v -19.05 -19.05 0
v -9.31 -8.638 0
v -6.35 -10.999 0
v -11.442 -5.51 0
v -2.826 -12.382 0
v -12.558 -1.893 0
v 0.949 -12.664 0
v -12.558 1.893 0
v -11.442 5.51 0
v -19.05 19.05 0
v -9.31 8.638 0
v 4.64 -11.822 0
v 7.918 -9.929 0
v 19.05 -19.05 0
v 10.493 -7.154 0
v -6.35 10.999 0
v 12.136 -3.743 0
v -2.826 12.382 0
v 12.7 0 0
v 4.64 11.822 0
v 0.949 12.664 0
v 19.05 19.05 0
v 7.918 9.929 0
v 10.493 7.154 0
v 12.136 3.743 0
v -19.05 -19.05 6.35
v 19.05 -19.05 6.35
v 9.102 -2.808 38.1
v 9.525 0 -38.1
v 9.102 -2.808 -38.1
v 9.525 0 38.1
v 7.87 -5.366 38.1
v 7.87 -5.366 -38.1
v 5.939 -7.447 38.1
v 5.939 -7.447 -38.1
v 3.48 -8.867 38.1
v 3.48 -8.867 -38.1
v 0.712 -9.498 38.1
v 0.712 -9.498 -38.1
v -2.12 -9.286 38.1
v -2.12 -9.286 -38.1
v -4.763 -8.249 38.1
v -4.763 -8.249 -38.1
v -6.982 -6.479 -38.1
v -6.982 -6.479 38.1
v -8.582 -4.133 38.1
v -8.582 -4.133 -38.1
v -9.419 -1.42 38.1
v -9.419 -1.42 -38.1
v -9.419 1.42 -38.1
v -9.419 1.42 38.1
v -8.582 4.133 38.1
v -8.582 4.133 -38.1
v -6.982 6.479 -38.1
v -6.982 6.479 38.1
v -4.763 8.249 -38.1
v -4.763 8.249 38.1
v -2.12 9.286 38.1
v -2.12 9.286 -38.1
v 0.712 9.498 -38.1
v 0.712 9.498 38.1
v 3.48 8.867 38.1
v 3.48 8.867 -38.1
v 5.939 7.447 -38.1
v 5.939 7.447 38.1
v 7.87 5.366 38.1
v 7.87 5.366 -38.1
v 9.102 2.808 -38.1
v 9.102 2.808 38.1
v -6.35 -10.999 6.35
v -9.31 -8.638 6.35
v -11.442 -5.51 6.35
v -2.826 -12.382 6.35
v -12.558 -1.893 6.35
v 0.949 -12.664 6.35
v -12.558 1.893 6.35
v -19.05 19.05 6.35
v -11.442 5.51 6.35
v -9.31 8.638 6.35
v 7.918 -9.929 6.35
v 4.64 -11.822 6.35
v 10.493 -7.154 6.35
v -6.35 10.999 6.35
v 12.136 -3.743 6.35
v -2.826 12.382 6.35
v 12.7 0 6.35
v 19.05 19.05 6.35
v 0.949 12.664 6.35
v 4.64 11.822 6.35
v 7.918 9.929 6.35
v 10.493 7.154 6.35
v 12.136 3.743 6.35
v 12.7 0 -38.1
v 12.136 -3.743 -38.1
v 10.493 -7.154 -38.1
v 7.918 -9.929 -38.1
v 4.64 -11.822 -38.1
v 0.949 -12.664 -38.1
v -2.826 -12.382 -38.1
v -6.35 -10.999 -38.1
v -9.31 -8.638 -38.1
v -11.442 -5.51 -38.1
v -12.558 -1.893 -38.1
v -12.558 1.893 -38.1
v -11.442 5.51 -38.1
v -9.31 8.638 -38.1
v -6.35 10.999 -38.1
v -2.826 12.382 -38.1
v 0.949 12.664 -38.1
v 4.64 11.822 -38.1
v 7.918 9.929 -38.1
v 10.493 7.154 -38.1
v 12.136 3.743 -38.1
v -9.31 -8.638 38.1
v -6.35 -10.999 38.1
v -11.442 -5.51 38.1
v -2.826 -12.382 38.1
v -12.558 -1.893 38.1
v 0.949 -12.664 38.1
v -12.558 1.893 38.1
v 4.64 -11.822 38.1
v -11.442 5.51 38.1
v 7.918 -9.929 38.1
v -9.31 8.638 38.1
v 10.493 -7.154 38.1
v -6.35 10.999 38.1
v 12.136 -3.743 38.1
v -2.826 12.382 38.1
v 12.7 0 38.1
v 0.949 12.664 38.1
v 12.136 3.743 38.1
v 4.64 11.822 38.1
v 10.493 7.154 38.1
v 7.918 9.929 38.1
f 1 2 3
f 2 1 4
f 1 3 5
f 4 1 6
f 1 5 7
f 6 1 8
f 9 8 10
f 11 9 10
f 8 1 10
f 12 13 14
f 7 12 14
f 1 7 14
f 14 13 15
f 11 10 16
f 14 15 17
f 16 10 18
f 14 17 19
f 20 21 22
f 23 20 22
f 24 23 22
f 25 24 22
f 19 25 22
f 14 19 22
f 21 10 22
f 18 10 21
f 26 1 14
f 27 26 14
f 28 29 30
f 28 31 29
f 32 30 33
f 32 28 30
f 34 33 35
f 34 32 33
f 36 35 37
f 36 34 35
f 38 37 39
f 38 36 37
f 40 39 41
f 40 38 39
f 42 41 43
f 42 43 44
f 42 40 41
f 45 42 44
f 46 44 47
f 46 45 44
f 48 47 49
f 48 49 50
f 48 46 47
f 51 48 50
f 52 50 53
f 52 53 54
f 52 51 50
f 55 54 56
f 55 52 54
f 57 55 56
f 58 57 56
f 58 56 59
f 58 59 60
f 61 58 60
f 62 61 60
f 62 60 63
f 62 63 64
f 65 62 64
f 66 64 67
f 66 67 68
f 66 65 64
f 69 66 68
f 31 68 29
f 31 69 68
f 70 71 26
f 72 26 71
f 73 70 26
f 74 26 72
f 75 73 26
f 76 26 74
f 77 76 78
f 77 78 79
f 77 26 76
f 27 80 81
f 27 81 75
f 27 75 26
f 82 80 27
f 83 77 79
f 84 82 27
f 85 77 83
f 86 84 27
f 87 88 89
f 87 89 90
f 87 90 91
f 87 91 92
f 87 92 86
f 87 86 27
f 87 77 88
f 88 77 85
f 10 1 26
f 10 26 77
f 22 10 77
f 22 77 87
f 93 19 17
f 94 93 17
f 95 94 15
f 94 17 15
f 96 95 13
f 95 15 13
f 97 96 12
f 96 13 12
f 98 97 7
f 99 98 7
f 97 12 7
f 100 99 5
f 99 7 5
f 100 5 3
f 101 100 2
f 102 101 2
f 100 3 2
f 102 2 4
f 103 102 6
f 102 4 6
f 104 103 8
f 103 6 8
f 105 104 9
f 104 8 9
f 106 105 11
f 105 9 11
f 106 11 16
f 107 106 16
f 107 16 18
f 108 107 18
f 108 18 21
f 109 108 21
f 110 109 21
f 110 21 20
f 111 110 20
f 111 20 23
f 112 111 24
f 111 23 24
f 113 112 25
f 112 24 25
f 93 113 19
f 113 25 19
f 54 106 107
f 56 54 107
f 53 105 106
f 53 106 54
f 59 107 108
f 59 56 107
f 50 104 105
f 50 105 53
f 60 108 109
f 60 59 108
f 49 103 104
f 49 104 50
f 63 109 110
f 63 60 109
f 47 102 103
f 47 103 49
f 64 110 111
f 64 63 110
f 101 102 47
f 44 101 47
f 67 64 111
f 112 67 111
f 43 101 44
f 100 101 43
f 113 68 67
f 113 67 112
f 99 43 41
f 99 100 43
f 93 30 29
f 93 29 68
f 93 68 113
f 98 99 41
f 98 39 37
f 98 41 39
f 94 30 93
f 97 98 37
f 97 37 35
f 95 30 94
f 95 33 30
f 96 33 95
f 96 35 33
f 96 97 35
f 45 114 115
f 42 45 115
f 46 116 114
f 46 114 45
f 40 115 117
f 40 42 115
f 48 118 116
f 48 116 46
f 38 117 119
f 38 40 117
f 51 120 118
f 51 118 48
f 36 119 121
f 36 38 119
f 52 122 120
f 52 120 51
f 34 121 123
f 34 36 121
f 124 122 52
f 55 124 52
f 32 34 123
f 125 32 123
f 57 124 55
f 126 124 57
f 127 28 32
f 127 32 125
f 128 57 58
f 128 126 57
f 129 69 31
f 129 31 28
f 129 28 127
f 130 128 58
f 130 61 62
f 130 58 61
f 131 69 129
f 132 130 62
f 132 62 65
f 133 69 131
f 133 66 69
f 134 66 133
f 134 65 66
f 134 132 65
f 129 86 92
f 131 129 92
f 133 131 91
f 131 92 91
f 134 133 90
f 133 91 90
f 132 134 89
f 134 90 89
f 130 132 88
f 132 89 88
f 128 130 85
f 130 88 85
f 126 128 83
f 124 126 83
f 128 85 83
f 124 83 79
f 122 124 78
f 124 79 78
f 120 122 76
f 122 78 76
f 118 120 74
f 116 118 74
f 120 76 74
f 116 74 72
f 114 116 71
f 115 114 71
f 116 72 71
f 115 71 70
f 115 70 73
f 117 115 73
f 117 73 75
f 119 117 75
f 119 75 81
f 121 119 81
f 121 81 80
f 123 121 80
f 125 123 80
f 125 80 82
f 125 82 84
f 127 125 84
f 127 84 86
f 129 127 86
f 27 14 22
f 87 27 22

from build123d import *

# Parameters (mm, degrees)
F0_R     = 12.7
F0_R_2   = 9.525
F1_DEPTH = 38.1
F2_W     = 38.1
F2_H     = 38.1
F2_R     = 9.525
F3_DEPTH = 6.35
F4_R     = 12.7
F4_R_2   = 9.525
F5_DEPTH = 38.1


with BuildPart() as f1:
    # F0 (on Top) → F1 (new body)
    with BuildSketch(Plane.XY):
        Circle(F0_R)
        Circle(F0_R_2, mode=Mode.SUBTRACT)
    extrude(amount=F1_DEPTH)

    # F2 (on Top) → F3 (join)
    with BuildSketch(Plane.XY):
        Rectangle(F2_W, F2_H)
        Circle(F2_R, mode=Mode.SUBTRACT)
    extrude(amount=F3_DEPTH)

    # F4 (on face) → F5 (join)
    with BuildSketch(Plane(origin=(0, 0, 0), x_dir=(1, 0, 0), z_dir=(0, 0, -1))):
        Circle(F4_R)
        Circle(F4_R_2, mode=Mode.SUBTRACT)
    extrude(amount=F5_DEPTH)


solid = f1.part
